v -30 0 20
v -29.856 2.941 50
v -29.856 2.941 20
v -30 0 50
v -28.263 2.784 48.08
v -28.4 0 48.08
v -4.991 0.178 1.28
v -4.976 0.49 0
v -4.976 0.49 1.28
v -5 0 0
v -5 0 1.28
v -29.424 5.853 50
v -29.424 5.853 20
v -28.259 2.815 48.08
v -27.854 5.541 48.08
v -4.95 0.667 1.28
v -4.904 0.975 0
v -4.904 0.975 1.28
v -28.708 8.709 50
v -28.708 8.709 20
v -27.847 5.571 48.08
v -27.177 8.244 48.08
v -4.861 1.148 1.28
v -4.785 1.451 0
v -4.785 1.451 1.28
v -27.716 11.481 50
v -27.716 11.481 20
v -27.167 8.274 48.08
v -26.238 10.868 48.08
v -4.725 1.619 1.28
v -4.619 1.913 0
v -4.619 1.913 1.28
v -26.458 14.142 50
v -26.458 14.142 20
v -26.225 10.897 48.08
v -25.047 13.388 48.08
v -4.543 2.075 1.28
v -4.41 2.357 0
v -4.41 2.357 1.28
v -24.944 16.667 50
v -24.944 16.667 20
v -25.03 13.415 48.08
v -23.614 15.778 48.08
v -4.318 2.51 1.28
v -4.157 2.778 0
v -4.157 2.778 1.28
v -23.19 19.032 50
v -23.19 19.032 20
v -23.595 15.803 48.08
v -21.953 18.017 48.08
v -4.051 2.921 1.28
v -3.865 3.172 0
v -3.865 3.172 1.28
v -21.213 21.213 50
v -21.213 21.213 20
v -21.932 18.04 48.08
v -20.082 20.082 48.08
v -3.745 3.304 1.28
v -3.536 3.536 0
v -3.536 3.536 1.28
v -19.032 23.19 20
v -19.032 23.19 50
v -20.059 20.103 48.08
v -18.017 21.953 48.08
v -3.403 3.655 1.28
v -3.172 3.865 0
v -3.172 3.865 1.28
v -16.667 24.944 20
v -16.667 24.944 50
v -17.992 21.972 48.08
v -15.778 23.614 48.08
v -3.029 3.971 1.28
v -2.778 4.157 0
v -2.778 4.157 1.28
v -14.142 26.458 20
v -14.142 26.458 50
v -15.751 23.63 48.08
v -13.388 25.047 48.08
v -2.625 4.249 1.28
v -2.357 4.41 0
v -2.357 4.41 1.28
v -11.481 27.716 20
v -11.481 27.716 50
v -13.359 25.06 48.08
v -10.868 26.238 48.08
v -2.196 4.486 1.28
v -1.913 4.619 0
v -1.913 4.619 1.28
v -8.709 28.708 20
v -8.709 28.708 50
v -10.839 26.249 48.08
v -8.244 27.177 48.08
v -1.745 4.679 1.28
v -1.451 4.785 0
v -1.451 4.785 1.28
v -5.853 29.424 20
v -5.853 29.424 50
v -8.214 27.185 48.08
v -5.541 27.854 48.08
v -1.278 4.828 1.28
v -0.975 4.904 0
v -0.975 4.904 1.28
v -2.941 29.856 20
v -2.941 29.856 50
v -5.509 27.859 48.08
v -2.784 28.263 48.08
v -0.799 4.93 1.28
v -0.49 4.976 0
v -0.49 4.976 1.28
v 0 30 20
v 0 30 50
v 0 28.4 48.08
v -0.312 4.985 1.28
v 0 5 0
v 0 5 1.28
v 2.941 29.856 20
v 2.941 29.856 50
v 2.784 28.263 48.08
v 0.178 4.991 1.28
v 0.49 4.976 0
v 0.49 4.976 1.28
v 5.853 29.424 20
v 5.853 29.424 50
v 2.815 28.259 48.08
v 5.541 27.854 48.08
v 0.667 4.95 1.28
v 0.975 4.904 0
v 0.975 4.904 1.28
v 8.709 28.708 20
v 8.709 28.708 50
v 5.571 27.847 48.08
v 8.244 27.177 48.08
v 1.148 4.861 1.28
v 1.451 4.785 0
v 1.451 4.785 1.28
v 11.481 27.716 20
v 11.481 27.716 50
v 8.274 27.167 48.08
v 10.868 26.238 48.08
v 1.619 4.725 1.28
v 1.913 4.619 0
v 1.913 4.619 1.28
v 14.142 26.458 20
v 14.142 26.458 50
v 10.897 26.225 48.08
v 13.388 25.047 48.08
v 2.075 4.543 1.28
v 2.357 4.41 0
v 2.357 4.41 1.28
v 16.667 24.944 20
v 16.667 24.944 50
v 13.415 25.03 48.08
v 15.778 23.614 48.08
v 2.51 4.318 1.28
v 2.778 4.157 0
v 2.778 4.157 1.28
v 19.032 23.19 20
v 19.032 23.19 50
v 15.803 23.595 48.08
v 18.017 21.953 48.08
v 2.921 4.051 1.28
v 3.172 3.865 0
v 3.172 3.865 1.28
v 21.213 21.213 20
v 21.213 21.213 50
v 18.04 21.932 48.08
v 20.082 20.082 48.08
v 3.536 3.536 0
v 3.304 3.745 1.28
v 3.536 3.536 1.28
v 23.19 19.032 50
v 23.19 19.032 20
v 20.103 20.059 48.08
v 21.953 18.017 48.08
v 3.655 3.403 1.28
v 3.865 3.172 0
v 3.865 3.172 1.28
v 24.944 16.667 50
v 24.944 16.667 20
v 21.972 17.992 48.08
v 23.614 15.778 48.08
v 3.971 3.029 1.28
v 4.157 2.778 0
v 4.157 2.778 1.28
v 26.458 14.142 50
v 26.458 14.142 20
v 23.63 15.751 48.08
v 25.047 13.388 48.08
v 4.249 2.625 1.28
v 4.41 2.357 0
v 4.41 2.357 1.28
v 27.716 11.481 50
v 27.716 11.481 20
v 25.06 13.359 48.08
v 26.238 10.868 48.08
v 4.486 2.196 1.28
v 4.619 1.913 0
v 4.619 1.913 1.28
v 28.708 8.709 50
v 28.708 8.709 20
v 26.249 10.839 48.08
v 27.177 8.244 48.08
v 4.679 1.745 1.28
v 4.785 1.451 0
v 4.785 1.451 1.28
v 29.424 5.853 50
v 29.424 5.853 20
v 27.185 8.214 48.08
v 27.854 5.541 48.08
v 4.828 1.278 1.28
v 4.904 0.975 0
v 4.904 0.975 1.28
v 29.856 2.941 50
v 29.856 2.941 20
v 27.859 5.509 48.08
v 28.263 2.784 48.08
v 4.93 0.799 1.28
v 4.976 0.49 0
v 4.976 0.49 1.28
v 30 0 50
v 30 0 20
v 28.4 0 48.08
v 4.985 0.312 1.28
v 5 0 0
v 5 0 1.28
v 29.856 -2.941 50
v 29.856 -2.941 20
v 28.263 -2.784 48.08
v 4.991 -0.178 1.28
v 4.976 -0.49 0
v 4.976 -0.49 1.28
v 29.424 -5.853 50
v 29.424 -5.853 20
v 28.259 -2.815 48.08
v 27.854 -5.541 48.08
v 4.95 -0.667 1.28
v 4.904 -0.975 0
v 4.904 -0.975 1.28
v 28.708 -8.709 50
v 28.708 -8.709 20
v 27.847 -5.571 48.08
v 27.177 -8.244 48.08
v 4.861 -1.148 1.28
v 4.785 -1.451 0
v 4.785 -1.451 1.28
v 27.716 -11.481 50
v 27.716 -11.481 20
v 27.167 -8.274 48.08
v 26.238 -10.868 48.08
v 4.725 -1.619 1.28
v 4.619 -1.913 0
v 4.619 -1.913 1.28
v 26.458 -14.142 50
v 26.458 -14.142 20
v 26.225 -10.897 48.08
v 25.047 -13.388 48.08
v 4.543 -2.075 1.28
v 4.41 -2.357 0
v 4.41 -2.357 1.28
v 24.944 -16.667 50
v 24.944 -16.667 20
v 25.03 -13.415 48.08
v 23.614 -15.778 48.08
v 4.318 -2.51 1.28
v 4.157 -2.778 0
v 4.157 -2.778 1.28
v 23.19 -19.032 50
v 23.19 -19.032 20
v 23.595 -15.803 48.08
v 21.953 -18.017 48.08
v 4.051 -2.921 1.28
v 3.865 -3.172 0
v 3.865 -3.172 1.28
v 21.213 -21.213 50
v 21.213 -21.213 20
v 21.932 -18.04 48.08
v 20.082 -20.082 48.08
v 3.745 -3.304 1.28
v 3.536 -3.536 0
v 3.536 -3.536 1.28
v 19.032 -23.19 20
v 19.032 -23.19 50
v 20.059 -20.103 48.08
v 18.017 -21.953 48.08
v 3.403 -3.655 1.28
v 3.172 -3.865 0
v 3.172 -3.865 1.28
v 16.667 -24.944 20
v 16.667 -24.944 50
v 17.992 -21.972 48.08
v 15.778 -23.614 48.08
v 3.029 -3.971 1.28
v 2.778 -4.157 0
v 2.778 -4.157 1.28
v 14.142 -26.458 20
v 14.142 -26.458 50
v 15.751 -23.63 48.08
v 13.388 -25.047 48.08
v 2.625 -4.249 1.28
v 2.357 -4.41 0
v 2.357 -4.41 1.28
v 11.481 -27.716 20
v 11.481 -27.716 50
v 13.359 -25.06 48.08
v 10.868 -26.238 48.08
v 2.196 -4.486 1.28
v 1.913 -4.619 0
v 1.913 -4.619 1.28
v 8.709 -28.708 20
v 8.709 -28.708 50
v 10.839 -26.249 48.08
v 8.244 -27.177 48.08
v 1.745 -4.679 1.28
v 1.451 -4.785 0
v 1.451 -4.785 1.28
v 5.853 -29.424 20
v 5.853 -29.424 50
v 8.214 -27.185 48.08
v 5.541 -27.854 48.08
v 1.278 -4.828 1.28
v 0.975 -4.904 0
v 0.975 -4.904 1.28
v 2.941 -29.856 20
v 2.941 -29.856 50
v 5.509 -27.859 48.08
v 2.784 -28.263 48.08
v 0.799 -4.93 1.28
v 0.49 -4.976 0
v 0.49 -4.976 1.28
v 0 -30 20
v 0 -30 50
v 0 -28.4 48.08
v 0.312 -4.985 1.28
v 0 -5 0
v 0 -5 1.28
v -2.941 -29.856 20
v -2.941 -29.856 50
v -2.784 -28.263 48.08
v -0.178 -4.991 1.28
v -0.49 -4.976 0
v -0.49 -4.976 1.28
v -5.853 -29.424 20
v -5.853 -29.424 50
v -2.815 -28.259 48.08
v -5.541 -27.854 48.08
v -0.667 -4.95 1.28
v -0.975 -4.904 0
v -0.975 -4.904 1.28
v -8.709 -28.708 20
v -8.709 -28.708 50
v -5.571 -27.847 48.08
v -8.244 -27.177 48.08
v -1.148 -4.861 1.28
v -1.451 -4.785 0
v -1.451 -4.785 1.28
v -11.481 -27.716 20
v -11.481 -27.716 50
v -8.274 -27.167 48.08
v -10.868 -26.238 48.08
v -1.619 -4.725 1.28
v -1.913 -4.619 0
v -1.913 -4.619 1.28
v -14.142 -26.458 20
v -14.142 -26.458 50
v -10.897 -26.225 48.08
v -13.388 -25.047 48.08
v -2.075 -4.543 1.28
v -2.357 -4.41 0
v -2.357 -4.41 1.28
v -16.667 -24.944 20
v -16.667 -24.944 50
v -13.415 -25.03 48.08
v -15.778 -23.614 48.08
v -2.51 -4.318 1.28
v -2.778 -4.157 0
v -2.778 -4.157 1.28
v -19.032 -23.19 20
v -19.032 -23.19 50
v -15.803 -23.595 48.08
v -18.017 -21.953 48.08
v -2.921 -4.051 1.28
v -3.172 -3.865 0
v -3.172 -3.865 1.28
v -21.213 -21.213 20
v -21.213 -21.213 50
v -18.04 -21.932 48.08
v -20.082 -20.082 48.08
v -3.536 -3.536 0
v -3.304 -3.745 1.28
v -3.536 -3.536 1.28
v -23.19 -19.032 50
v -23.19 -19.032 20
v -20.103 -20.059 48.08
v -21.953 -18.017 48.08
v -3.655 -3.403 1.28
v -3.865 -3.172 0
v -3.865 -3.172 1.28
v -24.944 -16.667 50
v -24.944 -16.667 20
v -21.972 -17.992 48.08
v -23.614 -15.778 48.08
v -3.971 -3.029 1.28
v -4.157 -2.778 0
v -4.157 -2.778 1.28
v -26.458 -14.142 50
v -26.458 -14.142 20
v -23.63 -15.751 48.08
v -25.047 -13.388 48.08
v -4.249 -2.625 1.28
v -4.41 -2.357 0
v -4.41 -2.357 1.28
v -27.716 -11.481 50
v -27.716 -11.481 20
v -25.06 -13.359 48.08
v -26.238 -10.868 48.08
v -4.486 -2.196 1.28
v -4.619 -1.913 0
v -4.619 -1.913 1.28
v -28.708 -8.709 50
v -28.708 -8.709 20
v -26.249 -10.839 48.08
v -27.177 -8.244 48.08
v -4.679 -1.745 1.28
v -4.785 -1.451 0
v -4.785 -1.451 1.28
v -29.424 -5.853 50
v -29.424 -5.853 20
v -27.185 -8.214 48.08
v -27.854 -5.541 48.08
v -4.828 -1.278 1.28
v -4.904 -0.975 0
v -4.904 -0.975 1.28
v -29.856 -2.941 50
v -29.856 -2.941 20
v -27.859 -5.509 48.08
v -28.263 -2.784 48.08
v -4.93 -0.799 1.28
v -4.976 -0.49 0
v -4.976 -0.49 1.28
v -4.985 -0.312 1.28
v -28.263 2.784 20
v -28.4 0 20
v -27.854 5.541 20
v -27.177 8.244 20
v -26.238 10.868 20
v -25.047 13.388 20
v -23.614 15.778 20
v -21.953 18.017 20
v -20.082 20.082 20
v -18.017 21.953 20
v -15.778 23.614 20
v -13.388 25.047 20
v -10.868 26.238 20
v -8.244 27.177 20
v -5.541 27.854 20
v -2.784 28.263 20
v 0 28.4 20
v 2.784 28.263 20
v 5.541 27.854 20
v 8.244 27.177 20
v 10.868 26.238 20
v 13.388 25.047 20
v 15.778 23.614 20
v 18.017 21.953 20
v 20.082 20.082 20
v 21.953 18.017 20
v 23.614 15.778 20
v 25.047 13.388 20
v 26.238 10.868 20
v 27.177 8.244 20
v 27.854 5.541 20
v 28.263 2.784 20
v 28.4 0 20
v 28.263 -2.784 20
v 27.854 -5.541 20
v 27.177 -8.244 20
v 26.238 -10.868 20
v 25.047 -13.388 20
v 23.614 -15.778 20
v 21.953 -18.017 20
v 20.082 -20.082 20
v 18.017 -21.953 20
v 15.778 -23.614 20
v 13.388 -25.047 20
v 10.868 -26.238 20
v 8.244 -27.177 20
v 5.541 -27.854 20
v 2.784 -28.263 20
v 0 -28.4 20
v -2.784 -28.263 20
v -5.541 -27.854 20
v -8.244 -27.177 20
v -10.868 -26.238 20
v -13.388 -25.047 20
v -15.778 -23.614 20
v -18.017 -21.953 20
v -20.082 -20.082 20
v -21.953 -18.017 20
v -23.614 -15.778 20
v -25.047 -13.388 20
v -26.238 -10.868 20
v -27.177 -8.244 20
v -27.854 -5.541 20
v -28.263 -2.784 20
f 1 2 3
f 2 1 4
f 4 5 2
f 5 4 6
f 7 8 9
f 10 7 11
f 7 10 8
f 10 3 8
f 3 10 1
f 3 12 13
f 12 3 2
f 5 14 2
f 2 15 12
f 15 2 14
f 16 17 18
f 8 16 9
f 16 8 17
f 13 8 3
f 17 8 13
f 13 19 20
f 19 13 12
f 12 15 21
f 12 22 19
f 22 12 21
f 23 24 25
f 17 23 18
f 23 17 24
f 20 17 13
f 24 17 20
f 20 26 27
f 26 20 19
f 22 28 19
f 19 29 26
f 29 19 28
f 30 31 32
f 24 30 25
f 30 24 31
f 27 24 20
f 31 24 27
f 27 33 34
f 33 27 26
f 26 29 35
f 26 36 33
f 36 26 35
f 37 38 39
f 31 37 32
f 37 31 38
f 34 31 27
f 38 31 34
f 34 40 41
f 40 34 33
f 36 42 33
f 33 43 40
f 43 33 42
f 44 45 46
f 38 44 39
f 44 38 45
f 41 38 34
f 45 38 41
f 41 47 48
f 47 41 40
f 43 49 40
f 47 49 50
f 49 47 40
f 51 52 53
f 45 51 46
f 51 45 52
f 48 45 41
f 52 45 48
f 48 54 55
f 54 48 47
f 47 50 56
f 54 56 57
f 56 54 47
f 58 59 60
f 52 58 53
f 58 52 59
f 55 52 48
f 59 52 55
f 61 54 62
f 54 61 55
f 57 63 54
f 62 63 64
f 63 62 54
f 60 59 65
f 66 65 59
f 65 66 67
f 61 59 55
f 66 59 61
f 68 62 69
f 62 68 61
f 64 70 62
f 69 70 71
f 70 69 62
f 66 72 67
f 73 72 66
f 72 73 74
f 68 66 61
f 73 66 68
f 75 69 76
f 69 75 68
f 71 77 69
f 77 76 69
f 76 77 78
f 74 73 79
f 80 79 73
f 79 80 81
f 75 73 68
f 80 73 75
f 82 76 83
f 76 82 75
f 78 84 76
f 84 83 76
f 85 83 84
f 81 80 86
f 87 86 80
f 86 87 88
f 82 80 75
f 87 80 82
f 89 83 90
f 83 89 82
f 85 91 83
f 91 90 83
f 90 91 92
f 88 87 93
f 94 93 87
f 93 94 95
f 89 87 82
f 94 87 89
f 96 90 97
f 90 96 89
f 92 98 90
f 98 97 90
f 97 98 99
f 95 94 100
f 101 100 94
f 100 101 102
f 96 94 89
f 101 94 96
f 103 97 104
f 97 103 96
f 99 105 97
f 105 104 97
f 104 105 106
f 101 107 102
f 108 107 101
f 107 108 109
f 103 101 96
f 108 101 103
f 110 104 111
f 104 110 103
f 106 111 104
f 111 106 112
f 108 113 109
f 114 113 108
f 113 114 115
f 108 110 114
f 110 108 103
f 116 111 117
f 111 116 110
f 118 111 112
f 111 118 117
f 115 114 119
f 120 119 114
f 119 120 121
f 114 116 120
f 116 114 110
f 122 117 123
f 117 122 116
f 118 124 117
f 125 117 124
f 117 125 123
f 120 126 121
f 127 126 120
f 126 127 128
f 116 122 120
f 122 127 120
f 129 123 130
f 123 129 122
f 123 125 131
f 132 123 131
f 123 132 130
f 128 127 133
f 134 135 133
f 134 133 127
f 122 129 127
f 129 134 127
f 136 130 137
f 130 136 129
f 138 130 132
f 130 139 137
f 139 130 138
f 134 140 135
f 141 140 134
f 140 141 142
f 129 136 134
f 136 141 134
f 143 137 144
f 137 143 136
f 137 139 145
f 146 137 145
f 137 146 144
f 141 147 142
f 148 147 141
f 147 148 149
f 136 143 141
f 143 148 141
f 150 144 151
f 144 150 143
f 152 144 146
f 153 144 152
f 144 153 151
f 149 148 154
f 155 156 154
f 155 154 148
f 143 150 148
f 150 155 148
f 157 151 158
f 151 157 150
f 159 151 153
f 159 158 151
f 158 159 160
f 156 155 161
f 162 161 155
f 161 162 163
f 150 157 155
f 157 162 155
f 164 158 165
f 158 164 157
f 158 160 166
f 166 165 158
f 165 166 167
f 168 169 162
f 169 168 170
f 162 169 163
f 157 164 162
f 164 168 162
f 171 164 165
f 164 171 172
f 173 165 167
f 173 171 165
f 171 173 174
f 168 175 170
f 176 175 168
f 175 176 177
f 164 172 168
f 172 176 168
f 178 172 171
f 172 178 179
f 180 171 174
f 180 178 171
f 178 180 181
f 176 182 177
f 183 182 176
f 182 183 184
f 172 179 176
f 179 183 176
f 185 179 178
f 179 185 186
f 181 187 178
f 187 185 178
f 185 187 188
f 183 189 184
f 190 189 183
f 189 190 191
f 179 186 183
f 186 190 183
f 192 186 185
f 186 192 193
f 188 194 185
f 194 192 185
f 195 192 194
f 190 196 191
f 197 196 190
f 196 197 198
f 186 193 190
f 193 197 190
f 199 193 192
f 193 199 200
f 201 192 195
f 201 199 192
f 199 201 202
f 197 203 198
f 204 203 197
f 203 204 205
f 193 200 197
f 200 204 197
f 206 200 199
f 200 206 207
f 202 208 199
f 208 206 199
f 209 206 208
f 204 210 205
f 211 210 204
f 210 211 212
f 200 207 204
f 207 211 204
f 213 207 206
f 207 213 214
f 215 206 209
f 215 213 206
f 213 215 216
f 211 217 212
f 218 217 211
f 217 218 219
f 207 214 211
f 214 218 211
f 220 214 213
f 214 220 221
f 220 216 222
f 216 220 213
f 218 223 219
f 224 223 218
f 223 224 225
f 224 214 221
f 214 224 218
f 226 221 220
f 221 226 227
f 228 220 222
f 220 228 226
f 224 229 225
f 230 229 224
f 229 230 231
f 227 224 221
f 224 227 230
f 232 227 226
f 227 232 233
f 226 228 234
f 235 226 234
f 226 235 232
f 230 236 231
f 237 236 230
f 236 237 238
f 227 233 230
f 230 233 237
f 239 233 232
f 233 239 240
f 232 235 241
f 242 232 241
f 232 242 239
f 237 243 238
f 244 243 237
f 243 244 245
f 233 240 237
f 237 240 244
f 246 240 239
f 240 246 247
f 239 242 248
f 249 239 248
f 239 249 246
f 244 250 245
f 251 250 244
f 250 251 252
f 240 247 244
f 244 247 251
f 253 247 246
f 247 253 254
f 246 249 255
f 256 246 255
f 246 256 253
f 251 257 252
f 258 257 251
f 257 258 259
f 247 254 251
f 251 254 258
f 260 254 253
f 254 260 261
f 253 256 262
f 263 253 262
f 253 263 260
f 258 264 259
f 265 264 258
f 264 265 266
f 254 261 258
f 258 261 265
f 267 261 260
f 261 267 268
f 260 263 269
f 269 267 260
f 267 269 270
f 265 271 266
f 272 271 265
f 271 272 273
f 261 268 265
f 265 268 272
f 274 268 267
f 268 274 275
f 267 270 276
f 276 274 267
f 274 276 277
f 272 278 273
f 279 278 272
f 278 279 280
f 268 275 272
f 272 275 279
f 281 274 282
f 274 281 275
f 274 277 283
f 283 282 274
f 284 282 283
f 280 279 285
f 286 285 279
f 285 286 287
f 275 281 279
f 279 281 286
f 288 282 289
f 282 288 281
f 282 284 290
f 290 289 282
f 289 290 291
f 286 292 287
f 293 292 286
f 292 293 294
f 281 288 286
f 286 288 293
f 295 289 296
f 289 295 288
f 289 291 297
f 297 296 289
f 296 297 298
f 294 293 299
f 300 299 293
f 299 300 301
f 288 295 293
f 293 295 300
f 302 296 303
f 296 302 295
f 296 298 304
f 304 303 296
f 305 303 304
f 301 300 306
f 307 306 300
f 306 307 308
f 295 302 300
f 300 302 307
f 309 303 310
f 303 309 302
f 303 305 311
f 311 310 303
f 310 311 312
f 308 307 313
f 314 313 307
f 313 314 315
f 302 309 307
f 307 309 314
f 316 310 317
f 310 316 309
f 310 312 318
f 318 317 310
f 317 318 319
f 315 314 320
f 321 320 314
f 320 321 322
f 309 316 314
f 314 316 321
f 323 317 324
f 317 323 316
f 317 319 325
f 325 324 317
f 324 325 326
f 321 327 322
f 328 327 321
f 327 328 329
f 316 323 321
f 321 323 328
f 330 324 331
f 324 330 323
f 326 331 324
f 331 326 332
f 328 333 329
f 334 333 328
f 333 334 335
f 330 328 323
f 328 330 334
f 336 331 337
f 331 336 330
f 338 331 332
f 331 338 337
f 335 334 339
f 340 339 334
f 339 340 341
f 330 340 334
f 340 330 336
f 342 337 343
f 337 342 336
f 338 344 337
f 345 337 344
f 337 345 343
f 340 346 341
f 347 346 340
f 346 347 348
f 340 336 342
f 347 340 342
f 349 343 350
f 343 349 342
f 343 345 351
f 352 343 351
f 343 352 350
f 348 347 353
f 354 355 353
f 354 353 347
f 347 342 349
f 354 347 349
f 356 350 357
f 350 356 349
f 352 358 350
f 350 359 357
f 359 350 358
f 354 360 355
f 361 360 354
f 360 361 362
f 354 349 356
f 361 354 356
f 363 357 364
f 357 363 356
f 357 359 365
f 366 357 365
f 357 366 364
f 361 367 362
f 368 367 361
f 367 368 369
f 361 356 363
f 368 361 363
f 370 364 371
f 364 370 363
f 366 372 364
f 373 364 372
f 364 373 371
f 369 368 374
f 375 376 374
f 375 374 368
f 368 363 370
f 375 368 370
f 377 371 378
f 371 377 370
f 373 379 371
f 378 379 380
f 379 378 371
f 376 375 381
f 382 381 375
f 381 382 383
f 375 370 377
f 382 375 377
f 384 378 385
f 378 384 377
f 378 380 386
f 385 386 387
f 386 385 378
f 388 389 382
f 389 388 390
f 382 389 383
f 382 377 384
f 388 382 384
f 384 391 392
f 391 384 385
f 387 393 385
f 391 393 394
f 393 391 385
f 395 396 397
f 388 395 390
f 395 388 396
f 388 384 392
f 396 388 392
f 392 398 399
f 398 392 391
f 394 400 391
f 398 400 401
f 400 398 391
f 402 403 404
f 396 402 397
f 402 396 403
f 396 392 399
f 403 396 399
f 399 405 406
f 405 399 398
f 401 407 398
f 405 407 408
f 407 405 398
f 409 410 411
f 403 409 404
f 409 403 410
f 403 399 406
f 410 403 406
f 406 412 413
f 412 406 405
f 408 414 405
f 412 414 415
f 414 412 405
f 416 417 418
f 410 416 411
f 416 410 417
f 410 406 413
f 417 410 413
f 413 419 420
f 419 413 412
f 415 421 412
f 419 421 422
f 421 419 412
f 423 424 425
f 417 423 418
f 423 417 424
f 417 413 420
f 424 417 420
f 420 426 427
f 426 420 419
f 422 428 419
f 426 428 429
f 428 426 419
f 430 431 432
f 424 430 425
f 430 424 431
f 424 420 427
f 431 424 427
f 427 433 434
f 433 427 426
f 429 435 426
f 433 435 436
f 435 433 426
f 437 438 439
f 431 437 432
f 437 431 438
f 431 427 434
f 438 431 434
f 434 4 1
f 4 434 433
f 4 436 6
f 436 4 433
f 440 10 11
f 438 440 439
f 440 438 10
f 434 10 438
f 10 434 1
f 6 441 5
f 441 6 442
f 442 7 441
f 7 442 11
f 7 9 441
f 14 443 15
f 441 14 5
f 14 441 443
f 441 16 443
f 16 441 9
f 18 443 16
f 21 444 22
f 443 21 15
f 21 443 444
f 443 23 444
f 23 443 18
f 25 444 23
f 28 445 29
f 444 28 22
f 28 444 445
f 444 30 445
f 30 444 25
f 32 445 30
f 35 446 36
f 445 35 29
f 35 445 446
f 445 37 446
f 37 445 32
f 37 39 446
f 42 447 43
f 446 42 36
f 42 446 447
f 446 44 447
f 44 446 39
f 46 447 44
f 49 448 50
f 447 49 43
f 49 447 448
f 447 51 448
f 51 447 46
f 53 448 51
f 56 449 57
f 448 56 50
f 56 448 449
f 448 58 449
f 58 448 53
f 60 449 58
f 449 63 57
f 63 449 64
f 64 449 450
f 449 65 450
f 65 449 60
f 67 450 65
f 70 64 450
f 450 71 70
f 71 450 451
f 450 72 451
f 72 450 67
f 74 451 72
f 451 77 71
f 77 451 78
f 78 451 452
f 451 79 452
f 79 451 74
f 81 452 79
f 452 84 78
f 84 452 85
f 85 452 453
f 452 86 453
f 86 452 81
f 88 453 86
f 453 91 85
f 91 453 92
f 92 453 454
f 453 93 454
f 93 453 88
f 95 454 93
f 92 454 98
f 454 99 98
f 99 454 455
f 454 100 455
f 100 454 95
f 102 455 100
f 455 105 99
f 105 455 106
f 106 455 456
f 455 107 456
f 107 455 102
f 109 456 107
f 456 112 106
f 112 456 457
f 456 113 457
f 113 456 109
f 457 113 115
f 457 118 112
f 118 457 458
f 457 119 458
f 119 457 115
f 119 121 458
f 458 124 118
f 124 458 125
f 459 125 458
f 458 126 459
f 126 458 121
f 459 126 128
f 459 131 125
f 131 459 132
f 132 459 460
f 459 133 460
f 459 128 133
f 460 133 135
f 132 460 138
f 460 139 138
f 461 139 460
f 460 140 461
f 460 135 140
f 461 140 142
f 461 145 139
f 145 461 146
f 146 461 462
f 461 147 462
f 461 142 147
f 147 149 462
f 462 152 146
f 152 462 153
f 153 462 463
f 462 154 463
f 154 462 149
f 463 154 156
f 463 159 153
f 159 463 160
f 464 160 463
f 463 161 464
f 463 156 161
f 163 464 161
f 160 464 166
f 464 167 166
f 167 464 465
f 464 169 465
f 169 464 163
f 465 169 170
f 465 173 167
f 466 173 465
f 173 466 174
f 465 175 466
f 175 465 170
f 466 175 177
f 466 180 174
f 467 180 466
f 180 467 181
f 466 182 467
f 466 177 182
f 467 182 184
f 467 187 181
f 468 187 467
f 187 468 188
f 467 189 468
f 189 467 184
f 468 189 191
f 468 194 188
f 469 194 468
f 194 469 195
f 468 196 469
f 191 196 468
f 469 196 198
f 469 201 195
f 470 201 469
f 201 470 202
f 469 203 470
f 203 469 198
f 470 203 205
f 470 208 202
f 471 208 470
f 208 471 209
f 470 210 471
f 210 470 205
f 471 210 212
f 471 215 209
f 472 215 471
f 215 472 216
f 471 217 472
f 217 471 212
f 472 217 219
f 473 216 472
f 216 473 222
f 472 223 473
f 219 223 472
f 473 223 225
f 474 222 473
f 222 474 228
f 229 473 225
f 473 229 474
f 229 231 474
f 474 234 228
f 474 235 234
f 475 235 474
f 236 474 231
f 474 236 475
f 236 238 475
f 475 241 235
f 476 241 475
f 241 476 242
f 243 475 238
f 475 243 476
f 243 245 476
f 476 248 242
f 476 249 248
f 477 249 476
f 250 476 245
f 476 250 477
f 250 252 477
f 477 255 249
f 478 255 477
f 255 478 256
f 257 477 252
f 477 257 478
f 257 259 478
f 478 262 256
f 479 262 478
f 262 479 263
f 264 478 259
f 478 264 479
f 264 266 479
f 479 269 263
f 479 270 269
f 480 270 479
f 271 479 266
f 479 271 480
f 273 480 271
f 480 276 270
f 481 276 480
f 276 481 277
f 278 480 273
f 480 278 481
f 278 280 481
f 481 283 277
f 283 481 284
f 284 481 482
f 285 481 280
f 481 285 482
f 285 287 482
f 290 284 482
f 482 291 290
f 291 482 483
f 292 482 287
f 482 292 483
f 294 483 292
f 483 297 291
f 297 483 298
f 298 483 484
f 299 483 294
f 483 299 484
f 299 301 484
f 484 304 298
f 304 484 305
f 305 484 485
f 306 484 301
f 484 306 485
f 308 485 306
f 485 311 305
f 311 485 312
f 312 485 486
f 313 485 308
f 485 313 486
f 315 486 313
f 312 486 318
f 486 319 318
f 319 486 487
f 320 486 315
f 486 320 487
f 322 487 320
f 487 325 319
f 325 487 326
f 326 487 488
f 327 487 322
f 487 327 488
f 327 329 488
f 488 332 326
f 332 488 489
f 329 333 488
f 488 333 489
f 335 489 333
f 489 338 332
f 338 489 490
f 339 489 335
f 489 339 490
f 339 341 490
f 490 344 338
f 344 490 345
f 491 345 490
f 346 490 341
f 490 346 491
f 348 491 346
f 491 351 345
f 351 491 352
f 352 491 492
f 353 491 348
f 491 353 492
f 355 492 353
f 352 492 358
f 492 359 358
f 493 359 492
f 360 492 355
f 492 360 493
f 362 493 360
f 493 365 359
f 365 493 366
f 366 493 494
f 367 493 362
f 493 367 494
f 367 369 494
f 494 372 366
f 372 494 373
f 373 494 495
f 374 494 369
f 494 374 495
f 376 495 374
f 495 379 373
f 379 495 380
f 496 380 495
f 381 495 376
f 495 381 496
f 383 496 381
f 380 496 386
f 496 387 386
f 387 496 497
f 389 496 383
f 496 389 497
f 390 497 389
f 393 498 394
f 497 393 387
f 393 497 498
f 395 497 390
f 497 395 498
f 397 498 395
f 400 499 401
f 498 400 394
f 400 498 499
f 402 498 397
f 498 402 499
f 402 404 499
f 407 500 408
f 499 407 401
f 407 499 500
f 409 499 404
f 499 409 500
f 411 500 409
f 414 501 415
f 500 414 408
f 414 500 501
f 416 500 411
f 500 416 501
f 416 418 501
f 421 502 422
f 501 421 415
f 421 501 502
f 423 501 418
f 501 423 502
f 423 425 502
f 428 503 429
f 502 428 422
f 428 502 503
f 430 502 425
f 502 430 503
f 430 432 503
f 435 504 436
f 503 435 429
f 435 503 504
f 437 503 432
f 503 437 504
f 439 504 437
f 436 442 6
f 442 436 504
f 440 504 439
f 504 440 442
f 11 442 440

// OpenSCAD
// Small lab funnel - straight spout with conical top, printed upright.
// Dimensions measured with calipers.

// Spout dimensions
spout_od = 10;
spout_id = 6.8;
spout_h  = 20;

// Cone dimensions
cone_bottom_od = 10;
cone_top_od    = 60;
cone_h         = 30; // from z=20 to z=50

// Wall thickness
wall = 1.6;

// Geometry helpers
$fn = 64;

// Calculate inner dimensions for the cone
cone_bottom_id = cone_bottom_od - 2 * wall;
cone_top_id    = cone_top_od - 2 * wall;

// Build the solid part
difference() {
    // 1. The outer shell (Single continuous profile extruded)
    // Profile points: [radius, height]
    // z=0 to z=20: radius = 5 (spout_od/2)
    // z=20 to z=50: radius grows from 5 to 30 (cone_top_od/2)
    translate([0, 0, 0])
        rotate_extrude($fn = 64)
            polygon([
                [spout_od/2, 0],
                [spout_od/2, spout_h],
                [cone_top_od/2, spout_h + cone_h],
                [cone_top_od/2, spout_h],
                [spout_od/2, 0]
            ]);
    
    // 2. The inner void (Single continuous profile extruded)
    // Profile points: [radius, height]
    // z=0 to z=20: radius = 3.4 (spout_id/2)
    // z=20 to z=50: radius grows from 3.4 to 26.7 (cone_top_id/2)
    translate([0, 0, 0])
        rotate_extrude($fn = 64)
            polygon([
                [spout_id/2, 0],
                [spout_id/2, spout_h],
                [cone_top_id/2, spout_h + cone_h],
                [cone_top_id/2, spout_h],
                [spout_id/2, 0]
            ]);
}
